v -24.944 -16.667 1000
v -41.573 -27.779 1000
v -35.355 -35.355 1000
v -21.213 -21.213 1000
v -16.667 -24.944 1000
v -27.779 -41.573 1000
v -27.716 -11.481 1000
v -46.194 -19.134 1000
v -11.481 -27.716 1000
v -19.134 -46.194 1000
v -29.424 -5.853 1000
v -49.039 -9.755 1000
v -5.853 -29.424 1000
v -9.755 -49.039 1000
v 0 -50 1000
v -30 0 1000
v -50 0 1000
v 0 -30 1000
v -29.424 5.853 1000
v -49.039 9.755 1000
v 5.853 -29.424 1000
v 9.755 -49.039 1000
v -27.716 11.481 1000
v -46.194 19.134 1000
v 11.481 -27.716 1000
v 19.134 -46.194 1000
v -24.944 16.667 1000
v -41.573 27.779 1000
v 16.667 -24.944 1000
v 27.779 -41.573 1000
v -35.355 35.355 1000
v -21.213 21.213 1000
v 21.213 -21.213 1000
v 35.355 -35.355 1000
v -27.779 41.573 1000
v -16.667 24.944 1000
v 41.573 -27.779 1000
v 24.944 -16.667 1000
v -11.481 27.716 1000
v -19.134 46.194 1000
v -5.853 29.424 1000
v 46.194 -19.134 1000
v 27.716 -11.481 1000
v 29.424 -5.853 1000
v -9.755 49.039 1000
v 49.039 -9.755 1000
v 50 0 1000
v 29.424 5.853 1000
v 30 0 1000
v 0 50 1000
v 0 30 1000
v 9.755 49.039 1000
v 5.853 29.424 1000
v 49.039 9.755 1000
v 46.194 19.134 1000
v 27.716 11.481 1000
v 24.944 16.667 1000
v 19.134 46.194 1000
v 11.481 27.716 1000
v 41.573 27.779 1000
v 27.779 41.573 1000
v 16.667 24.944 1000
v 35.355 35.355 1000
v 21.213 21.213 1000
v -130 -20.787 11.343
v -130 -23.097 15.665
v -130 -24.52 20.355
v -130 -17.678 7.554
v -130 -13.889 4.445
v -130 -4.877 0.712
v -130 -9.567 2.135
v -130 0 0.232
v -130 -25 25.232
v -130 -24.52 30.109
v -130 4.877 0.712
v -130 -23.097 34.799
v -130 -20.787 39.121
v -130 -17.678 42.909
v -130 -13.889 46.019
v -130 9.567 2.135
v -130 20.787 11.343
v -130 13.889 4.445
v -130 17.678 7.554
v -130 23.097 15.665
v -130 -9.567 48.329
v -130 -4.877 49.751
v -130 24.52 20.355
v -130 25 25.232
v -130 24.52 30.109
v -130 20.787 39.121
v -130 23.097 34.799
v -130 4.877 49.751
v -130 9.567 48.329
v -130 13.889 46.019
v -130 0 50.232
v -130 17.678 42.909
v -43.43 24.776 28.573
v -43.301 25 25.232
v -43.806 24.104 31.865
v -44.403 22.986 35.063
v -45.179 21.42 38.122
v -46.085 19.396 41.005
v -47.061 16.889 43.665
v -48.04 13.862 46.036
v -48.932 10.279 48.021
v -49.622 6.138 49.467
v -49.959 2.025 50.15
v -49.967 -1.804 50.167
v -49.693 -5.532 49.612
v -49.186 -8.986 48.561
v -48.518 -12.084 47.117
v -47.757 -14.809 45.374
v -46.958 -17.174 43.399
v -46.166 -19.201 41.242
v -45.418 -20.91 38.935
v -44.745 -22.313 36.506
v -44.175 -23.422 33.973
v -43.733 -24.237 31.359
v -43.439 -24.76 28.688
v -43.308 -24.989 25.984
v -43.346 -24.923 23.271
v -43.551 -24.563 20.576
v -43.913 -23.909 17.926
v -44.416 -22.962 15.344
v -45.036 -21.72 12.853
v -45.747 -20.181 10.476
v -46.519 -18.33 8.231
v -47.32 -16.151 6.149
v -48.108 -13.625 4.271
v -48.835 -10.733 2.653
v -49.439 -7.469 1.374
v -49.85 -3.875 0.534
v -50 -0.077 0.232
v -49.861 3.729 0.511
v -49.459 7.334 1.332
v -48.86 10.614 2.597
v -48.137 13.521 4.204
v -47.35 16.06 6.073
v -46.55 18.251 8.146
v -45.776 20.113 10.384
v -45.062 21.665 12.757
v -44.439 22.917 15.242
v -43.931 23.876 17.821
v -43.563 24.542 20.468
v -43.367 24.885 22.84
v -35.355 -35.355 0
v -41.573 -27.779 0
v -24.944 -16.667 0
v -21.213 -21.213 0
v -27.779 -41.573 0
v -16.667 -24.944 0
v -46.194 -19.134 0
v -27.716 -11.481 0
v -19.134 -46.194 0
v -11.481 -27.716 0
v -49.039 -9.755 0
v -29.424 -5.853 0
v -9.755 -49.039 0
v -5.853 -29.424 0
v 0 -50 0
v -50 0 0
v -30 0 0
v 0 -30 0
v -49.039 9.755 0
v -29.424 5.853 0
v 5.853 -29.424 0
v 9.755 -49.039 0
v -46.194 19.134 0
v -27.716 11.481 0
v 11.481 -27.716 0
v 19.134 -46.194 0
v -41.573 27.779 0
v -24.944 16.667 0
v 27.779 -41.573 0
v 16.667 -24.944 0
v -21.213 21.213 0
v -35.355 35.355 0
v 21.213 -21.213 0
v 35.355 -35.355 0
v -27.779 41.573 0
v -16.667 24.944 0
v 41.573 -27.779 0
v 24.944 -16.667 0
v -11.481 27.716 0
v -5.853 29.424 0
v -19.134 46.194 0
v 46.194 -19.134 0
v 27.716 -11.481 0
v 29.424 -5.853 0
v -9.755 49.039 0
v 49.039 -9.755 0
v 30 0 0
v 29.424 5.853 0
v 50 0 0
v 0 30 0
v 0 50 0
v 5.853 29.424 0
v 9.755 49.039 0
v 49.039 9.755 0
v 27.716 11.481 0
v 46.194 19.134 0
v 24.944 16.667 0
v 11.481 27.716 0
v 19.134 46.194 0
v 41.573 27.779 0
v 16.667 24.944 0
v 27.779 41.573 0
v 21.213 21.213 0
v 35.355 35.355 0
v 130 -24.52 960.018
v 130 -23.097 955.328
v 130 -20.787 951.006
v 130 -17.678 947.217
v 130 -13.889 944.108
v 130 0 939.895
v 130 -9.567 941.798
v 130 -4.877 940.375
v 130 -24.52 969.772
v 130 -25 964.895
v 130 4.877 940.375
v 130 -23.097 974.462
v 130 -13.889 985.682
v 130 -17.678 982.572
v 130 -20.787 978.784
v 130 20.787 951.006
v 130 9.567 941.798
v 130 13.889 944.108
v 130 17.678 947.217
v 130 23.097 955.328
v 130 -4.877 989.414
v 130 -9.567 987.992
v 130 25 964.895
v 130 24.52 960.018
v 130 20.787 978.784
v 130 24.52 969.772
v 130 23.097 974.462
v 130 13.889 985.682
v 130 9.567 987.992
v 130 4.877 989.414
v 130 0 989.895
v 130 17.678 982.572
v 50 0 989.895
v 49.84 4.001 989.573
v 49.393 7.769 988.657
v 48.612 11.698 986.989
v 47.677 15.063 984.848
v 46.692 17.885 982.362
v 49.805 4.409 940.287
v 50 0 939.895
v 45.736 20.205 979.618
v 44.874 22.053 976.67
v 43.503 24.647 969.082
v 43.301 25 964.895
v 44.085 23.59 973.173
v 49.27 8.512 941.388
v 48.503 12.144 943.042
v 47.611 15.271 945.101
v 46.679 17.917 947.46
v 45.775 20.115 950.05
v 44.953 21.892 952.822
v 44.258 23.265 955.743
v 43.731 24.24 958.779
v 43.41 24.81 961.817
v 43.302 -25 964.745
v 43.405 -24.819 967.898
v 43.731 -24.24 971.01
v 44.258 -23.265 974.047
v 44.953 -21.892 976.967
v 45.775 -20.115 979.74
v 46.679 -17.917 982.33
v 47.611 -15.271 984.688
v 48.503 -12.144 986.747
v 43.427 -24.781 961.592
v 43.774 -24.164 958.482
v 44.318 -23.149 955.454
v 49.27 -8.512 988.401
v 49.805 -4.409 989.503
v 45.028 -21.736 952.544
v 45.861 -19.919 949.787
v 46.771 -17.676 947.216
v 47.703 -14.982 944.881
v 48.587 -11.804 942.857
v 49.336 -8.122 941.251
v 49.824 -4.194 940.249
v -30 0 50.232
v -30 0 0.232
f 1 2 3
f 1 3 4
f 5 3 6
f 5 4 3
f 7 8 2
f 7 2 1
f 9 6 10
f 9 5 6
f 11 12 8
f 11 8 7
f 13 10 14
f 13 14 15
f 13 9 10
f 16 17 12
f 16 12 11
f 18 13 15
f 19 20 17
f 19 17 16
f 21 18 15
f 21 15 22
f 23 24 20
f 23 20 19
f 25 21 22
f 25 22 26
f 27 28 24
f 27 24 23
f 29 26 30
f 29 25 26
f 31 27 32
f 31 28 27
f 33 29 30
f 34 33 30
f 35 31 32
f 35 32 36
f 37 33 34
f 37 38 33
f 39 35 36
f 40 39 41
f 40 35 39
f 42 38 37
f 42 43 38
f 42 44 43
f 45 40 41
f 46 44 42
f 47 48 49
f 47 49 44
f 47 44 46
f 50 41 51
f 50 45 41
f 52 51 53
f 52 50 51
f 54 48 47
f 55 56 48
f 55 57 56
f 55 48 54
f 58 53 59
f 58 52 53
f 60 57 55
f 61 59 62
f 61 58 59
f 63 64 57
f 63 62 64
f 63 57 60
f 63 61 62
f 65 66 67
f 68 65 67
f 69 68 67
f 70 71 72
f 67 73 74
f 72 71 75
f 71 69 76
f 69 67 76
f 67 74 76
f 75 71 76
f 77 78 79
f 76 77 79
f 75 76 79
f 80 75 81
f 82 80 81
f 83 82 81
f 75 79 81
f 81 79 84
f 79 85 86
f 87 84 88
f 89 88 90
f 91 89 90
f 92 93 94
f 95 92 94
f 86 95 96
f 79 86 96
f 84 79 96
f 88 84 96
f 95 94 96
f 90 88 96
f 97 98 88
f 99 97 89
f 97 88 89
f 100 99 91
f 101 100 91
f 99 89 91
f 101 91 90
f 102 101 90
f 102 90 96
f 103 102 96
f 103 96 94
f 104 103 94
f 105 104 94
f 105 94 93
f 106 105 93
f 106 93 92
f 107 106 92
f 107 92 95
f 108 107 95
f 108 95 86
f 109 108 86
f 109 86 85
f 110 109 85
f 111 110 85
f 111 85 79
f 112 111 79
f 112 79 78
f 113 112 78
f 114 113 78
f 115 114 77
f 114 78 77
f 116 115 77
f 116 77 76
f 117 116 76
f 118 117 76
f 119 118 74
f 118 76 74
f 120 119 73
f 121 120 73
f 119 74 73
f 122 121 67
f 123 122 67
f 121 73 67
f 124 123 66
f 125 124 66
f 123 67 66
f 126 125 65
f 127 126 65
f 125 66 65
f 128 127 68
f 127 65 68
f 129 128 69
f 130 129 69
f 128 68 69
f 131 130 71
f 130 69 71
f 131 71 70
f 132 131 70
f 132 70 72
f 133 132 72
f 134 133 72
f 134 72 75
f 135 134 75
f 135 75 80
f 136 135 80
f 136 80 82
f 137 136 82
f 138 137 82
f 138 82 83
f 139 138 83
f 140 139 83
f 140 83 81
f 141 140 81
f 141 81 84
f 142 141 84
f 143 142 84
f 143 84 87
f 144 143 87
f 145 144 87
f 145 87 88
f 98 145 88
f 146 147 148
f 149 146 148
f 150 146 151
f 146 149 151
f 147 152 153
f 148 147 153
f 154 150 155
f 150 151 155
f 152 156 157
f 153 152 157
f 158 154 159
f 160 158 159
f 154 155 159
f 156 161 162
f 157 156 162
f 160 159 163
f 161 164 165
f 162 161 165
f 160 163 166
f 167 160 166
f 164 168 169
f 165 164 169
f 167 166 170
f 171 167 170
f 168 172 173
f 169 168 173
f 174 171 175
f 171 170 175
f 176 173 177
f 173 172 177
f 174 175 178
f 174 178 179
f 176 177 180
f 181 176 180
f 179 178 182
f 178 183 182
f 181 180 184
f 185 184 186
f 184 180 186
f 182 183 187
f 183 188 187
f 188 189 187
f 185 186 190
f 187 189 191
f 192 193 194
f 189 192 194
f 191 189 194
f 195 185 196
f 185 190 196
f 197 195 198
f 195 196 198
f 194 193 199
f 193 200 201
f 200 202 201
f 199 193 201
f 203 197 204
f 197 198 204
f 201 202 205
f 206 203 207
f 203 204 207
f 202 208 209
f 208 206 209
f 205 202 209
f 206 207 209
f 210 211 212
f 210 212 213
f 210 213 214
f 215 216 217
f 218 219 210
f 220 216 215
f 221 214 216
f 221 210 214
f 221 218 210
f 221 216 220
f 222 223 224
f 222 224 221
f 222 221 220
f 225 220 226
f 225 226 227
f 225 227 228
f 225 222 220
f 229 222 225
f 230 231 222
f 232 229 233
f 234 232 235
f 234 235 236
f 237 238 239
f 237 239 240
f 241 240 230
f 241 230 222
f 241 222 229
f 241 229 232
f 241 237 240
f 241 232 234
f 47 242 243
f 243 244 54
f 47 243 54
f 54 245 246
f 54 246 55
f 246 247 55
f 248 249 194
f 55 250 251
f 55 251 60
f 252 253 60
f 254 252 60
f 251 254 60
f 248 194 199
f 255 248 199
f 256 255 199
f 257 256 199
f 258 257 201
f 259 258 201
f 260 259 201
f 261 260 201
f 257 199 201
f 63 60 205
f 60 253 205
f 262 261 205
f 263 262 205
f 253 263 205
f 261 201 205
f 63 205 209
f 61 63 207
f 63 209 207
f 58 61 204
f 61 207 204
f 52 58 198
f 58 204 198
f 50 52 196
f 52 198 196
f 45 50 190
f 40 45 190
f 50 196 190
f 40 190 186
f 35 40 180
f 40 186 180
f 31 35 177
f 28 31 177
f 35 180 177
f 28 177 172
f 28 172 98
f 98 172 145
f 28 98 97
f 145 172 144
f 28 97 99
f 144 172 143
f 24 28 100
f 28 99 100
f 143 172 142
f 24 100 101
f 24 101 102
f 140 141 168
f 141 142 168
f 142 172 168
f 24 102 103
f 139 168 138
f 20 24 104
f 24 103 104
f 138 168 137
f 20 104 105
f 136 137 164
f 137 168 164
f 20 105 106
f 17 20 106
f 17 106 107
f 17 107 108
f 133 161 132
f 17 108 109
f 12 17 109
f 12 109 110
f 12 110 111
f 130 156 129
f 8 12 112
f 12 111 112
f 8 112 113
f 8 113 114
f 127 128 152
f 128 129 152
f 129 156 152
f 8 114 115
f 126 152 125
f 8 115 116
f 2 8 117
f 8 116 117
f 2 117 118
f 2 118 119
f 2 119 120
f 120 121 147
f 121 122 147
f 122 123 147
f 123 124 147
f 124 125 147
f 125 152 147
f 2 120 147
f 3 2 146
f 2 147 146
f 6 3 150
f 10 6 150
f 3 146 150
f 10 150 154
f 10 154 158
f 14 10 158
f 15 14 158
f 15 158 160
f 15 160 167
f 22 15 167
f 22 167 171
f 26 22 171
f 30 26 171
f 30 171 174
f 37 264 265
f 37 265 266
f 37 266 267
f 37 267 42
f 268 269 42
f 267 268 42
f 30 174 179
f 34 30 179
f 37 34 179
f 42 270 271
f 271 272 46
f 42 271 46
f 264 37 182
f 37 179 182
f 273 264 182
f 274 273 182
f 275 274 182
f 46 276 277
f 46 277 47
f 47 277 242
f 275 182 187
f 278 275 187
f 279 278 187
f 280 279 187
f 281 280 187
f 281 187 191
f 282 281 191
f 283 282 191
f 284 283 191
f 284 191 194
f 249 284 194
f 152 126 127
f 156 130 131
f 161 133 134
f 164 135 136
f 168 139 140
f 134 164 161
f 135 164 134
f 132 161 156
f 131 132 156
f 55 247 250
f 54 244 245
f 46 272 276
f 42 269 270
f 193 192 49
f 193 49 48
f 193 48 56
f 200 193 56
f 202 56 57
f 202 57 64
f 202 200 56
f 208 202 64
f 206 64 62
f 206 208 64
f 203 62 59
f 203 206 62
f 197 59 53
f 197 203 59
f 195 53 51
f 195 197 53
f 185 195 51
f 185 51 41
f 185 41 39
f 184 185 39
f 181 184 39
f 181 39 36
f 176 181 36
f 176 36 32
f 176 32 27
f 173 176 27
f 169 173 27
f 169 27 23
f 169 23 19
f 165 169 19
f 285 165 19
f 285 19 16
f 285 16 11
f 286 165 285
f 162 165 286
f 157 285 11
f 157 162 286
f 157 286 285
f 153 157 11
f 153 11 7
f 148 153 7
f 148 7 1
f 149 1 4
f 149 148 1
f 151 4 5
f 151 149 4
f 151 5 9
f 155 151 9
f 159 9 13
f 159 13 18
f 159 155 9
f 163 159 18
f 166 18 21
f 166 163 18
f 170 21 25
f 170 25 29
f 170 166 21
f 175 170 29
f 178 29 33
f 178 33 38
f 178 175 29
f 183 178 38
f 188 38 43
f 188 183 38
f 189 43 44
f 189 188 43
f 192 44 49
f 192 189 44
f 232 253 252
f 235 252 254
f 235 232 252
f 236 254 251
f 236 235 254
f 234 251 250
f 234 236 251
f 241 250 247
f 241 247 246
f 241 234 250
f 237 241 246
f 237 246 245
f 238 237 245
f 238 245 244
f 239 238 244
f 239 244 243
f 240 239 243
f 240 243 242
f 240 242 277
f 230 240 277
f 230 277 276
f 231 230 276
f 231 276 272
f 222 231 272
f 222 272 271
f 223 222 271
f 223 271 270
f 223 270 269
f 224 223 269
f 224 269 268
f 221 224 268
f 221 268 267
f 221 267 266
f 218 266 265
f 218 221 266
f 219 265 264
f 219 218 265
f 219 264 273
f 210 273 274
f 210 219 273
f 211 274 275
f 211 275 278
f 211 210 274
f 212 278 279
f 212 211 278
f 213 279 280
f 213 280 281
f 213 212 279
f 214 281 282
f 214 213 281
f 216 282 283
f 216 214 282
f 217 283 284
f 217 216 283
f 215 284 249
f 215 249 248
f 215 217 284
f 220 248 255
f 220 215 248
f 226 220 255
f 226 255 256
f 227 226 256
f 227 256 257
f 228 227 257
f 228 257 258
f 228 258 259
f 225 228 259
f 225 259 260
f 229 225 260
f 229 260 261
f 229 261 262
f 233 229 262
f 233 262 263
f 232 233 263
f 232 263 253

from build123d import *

# Parameters (mm, degrees)
F0_R     = 50
F0_R_2   = 30
F1_DEPTH = 1000
F3_R     = 25
F4_DEPTH = 100
F6_R     = 25
F7_DEPTH = 100


with BuildPart() as f1:
    # F0 (on Top) → F1 (new body)
    with BuildSketch(Plane.XY):
        Circle(F0_R)
        Circle(F0_R_2, mode=Mode.SUBTRACT)
    extrude(amount=F1_DEPTH)

    # F3 (on offset) → F4 (join)
    with BuildSketch(Plane.YZ.offset(-130)):
        with Locations((0, 25.231782)):
            Circle(F3_R)
    extrude(amount=F4_DEPTH)

    # F6 (on offset) → F7 (join)
    with BuildSketch(Plane.YZ.offset(130)):
        with Locations((0, 964.894772)):
            Circle(F6_R)
    extrude(amount=-F7_DEPTH)


solid = f1.part
